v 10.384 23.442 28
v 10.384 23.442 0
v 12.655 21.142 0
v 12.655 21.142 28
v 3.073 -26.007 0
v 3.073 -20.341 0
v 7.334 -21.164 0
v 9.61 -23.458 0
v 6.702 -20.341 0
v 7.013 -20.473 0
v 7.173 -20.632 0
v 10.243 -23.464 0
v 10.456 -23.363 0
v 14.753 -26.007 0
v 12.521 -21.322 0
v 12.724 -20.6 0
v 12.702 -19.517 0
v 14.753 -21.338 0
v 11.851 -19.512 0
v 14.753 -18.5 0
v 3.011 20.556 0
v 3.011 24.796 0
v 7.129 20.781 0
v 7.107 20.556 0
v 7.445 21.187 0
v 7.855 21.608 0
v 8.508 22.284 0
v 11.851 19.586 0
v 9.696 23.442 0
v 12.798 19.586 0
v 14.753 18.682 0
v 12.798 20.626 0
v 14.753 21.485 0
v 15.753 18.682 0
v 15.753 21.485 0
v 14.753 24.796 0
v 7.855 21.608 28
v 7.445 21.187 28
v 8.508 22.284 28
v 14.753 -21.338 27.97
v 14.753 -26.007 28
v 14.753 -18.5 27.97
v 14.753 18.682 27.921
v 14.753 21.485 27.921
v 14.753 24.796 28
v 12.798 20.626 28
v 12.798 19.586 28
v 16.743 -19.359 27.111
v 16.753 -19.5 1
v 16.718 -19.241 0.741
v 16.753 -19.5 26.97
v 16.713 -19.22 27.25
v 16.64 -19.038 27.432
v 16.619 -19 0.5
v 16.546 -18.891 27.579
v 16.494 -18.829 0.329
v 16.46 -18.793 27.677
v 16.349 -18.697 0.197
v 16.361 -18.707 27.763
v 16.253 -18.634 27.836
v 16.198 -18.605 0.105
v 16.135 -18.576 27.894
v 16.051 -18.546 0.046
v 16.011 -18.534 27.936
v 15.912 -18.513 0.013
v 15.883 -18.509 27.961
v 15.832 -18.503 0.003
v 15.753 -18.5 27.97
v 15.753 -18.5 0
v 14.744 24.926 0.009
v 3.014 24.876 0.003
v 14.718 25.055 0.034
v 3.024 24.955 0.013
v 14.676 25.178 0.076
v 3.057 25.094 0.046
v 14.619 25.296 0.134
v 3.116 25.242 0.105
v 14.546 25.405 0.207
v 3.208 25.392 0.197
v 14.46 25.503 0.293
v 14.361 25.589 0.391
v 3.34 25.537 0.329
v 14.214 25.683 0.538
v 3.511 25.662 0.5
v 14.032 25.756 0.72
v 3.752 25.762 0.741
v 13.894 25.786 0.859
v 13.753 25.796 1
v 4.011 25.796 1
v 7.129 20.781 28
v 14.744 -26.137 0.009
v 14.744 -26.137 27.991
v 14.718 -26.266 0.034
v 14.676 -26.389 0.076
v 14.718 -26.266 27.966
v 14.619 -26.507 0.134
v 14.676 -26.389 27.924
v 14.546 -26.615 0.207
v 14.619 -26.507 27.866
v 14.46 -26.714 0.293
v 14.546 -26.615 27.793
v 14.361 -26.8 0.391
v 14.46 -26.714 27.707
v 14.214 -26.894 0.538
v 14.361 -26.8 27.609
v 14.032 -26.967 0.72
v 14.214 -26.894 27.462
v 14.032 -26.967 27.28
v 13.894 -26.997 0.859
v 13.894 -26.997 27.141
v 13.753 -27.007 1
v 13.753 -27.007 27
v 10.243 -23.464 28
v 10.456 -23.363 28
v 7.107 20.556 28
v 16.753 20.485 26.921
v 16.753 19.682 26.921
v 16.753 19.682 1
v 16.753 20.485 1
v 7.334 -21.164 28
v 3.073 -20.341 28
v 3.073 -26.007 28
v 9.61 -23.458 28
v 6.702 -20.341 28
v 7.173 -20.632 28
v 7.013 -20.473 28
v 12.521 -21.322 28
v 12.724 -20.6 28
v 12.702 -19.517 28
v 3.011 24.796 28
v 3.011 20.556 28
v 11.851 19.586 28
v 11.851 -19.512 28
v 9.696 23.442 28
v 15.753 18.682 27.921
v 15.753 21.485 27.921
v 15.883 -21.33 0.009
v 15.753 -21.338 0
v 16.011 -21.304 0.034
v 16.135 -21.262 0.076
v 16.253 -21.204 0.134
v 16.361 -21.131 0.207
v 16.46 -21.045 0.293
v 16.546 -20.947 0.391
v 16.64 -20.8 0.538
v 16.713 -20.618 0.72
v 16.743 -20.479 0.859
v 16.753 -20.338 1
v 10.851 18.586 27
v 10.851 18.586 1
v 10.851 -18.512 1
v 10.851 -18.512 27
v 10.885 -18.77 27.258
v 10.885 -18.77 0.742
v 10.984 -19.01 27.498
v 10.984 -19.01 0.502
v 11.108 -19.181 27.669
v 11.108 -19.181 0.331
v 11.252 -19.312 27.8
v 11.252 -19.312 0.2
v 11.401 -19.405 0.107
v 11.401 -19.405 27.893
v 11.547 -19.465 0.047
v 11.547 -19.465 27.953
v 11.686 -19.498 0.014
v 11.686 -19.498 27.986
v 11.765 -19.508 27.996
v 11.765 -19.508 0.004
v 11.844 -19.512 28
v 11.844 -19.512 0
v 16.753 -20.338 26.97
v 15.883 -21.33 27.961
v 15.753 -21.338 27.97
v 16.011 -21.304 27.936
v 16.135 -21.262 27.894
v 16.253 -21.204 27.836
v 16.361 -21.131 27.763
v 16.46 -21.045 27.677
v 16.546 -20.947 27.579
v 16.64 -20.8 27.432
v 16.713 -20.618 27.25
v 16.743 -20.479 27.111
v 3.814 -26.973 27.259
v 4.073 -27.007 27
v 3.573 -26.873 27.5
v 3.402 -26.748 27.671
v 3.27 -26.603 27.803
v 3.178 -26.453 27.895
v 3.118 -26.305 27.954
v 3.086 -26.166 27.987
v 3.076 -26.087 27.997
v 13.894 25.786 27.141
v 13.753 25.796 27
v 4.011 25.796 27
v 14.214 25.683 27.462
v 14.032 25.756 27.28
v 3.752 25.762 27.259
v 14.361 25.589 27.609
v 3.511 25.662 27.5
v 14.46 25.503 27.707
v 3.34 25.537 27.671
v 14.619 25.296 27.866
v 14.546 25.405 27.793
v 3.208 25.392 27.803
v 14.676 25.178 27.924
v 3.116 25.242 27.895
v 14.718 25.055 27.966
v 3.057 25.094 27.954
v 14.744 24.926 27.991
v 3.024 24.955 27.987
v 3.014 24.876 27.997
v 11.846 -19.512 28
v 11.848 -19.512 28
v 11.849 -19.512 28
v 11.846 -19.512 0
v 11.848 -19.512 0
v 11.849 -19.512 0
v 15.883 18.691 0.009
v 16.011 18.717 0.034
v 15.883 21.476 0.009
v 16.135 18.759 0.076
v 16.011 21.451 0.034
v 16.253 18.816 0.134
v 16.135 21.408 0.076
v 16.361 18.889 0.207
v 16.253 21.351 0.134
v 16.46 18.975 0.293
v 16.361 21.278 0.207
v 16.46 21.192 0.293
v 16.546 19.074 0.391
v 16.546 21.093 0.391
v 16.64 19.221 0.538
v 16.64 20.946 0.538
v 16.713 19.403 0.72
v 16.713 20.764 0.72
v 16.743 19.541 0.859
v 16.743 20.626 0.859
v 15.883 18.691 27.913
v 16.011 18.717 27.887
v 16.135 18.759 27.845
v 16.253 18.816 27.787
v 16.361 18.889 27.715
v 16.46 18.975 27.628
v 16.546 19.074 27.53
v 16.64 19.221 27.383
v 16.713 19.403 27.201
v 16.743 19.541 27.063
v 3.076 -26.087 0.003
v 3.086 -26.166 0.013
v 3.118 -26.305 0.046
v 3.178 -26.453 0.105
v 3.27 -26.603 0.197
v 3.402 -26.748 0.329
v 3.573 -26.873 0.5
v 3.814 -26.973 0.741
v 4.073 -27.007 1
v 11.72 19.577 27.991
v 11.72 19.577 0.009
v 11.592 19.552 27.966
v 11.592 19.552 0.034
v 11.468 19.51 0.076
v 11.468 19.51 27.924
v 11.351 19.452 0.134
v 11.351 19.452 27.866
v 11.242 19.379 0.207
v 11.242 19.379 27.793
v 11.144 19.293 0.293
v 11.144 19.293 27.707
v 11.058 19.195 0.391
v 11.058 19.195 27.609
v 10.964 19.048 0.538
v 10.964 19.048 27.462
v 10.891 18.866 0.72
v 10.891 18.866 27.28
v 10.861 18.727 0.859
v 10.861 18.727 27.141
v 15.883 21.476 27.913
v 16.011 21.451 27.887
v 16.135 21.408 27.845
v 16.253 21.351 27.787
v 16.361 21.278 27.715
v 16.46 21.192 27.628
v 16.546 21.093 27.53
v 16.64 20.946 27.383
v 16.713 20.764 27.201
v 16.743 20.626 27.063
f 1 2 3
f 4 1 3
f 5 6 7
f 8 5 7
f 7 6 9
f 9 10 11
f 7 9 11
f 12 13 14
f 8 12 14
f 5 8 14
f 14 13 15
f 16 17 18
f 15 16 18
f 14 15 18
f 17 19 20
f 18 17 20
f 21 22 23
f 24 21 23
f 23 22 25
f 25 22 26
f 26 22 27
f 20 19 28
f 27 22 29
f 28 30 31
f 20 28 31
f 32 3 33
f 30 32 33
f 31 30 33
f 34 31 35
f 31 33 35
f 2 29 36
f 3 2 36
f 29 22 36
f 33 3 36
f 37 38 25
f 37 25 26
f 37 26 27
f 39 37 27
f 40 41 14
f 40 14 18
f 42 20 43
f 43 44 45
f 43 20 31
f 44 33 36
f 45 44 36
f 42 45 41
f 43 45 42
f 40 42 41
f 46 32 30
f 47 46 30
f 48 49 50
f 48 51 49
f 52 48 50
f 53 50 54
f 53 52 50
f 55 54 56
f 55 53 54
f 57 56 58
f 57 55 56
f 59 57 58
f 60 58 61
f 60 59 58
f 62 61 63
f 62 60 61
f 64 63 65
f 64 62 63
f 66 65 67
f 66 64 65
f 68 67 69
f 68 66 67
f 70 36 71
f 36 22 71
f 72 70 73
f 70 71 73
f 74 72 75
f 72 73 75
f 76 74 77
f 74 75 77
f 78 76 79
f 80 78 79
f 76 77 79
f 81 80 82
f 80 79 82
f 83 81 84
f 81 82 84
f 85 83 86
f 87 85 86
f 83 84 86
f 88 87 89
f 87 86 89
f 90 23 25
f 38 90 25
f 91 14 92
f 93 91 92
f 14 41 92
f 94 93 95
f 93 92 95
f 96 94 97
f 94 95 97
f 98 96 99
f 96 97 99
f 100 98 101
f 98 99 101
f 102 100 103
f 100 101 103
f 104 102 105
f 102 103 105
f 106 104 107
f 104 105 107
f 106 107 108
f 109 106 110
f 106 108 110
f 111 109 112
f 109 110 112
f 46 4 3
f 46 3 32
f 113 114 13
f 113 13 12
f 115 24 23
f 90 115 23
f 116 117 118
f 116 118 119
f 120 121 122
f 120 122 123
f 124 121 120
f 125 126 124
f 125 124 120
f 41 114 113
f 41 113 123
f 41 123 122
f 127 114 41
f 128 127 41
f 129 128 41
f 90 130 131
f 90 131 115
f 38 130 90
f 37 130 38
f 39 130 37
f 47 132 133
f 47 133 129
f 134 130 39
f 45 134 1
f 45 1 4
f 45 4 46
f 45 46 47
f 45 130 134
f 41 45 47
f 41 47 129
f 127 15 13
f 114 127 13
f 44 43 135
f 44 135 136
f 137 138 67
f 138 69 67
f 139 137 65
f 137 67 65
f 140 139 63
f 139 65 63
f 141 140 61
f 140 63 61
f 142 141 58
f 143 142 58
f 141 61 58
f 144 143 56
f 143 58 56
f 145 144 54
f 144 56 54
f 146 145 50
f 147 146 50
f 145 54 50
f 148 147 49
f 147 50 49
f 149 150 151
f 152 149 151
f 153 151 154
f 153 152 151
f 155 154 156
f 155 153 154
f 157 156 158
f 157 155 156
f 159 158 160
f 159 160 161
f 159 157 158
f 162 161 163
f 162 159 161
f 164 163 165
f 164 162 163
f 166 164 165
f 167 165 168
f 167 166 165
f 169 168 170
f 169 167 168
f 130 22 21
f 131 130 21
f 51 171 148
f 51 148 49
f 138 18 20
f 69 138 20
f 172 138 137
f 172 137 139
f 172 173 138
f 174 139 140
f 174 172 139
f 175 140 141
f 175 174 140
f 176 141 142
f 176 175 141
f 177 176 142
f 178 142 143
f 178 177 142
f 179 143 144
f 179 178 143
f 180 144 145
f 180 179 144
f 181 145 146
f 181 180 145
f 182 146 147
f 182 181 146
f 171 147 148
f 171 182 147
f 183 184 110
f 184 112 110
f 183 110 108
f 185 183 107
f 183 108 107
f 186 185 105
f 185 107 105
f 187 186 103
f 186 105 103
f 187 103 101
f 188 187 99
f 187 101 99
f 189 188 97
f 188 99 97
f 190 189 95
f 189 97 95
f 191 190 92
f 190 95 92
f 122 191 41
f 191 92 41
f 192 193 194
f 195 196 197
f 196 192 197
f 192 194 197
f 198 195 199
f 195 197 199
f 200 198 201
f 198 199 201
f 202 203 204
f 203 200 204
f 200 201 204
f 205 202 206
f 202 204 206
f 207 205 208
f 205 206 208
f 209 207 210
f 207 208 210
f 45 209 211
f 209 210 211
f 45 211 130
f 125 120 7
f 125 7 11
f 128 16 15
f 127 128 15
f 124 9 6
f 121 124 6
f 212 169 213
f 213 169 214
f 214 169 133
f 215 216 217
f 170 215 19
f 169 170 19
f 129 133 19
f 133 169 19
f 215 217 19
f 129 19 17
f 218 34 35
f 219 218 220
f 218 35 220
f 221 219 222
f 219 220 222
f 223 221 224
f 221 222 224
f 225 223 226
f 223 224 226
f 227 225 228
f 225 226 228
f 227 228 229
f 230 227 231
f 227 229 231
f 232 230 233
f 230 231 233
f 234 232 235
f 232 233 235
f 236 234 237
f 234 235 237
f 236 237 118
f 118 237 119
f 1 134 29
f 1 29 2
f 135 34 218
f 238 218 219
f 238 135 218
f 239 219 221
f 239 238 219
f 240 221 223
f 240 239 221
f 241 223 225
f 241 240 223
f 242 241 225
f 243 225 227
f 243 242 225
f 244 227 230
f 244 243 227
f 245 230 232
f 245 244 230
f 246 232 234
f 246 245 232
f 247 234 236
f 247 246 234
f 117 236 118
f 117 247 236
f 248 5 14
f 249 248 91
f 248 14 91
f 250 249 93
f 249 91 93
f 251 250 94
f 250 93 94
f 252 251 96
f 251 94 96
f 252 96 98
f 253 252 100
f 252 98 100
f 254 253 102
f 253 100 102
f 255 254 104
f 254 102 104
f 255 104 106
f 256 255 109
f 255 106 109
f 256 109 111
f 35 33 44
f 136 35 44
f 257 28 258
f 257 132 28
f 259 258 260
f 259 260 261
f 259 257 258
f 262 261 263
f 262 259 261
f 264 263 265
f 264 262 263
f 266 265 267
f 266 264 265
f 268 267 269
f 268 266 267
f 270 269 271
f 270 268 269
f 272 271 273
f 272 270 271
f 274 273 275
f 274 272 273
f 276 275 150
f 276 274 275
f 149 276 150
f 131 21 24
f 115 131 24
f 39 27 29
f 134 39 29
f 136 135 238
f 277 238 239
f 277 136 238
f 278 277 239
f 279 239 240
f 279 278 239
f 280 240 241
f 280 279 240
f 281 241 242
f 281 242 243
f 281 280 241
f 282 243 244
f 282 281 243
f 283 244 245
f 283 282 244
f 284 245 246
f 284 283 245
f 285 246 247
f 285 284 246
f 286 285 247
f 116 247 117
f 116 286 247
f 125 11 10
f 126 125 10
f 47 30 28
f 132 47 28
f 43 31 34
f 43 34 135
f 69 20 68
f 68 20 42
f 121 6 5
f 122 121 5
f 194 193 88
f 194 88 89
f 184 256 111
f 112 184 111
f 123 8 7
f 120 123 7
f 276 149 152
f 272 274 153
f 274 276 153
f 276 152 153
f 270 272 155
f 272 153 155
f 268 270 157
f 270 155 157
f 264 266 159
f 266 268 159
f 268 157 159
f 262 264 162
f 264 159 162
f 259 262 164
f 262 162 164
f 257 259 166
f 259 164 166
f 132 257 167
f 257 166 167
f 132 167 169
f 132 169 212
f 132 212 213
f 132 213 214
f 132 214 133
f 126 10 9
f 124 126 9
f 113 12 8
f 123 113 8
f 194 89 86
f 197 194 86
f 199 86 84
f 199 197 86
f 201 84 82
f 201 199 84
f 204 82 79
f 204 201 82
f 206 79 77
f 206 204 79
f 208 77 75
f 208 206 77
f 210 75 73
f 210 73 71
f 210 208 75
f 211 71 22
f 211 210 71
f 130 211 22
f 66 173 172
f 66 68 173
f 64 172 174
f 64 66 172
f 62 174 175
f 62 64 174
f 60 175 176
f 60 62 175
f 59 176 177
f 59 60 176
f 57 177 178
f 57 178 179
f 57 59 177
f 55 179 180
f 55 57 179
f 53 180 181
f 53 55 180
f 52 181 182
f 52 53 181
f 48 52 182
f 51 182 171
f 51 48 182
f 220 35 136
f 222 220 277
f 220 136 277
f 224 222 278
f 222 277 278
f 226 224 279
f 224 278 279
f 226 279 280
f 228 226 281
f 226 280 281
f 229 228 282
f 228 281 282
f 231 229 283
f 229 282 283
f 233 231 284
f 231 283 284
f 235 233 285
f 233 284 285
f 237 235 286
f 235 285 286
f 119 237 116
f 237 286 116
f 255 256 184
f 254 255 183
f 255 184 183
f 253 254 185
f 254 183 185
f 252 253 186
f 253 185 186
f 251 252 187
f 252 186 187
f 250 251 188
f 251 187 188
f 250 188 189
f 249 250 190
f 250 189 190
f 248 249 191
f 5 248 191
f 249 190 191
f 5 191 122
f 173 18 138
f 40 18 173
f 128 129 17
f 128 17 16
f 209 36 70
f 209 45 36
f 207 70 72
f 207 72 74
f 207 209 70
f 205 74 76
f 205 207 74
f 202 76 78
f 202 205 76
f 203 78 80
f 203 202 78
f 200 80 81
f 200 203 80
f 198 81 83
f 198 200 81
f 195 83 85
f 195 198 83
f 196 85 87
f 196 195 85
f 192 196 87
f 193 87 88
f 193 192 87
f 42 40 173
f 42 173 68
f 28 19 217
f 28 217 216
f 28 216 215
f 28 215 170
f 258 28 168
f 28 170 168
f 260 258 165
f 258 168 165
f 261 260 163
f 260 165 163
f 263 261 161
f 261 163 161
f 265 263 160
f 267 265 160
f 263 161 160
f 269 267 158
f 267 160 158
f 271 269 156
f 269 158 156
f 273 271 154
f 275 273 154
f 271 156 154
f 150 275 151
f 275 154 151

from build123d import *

# Parameters (mm, degrees)
PAD_DEPTH    = 28
SKETCH002_W  = 2.838082
SKETCH002_H  = 27.969857
PAD001_DEPTH = 2
FILLET_R     = 1
SKETCH003_W  = 2.802156
SKETCH003_H  = 27.921276
PAD002_DEPTH = 2
FILLET001_R  = 1
FILLET002_R  = 1
FILLET003_R  = 1
FILLET004_R  = 1


with BuildPart() as part:
    # Sketch001 → Pad (new body)
    with BuildSketch(Plane.XY):
        Polygon((7.12948, 20.78117), (7.445243, 21.187149), (7.854891, 21.607611), (8.508251, 22.283501), (9.696487, 23.44212), (10.384461, 23.44212), (12.655314, 21.14204), (12.798072, 20.62591), (12.798072, 19.983595), (12.798072, 19.585785), (10.85096, 19.585785), (10.85096, 17.475296), (10.85096, 14.854997), (10.85096, -19.505323), (12.701512, -19.51746), (12.724067, -20.600073), (12.521076, -21.321814), (10.456077, -23.362608), (10.24308, -23.464483), (9.610203, -23.458431), (7.33356, -21.163933), (7.172753, -20.632019), (7.013088, -20.473427), (6.702209, -20.340731), (3.07281, -20.340731), (3.07281, -27.006718), (14.752544, -27.006718), (14.752544, 25.795757), (3.011012, 25.795757), (3.011012, 20.555626), (7.106926, 20.555626), align=None)
    extrude(amount=PAD_DEPTH)

    # Sketch002 → Pad001 (new body)
    with BuildSketch(Plane.YZ.offset(14.752544)):
        with Locations((-19.919058, 13.984928)):
            Rectangle(SKETCH002_W, SKETCH002_H)
    extrude(amount=PAD001_DEPTH)

    # Fillet
    fillet_edges = [part.edges().sort_by_distance(p)[0] for p in [
        (16.752544, -19.919058, 27.969857),
        (16.752544, -18.500017, 13.984929),
        (16.752544, -19.919058, 0),
        (16.752544, -21.338099, 13.984929),
    ]]
    fillet(fillet_edges, radius=FILLET_R)

    # Sketch003 → Pad002 (new body)
    with BuildSketch(Plane.YZ.offset(14.752544)):
        with Locations((20.083518, 13.960638)):
            Rectangle(SKETCH003_W, SKETCH003_H)
    extrude(amount=PAD002_DEPTH)

    # Fillet001
    fillet001_edges = [part.edges().sort_by_distance(p)[0] for p in [
        (16.752544, 20.083518, 27.921276),
        (16.752544, 21.484596, 13.960638),
        (16.752544, 20.083518, 0),
        (16.752544, 18.68244, 13.960638),
    ]]
    fillet(fillet001_edges, radius=FILLET001_R)

    # Fillet002
    fillet002_edges = [part.edges().sort_by_distance(p)[0] for p in [
        (3.07281, -27.006718, 14),
        (14.752544, -27.006718, 14),
        (8.912677, -27.006718, 0),
        (8.912677, -27.006718, 28),
    ]]
    fillet(fillet002_edges, radius=FILLET002_R)

    # Fillet003
    fillet003_edges = [part.edges().sort_by_distance(p)[0] for p in [
        (14.752544, 25.795757, 14),
        (3.011012, 25.795757, 14),
        (8.881778, 25.795757, 0),
        (8.881778, 25.795757, 28),
    ]]
    fillet(fillet003_edges, radius=FILLET003_R)

    # Fillet004
    fillet004_edges = [part.edges().sort_by_distance(p)[0] for p in [
        (10.85096, 19.585785, 14),
        (10.85096, 0.040231, 0),
        (10.85096, -19.505323, 14),
        (10.85096, 0.040231, 28),
    ]]
    fillet(fillet004_edges, radius=FILLET004_R)


solid = part.part
